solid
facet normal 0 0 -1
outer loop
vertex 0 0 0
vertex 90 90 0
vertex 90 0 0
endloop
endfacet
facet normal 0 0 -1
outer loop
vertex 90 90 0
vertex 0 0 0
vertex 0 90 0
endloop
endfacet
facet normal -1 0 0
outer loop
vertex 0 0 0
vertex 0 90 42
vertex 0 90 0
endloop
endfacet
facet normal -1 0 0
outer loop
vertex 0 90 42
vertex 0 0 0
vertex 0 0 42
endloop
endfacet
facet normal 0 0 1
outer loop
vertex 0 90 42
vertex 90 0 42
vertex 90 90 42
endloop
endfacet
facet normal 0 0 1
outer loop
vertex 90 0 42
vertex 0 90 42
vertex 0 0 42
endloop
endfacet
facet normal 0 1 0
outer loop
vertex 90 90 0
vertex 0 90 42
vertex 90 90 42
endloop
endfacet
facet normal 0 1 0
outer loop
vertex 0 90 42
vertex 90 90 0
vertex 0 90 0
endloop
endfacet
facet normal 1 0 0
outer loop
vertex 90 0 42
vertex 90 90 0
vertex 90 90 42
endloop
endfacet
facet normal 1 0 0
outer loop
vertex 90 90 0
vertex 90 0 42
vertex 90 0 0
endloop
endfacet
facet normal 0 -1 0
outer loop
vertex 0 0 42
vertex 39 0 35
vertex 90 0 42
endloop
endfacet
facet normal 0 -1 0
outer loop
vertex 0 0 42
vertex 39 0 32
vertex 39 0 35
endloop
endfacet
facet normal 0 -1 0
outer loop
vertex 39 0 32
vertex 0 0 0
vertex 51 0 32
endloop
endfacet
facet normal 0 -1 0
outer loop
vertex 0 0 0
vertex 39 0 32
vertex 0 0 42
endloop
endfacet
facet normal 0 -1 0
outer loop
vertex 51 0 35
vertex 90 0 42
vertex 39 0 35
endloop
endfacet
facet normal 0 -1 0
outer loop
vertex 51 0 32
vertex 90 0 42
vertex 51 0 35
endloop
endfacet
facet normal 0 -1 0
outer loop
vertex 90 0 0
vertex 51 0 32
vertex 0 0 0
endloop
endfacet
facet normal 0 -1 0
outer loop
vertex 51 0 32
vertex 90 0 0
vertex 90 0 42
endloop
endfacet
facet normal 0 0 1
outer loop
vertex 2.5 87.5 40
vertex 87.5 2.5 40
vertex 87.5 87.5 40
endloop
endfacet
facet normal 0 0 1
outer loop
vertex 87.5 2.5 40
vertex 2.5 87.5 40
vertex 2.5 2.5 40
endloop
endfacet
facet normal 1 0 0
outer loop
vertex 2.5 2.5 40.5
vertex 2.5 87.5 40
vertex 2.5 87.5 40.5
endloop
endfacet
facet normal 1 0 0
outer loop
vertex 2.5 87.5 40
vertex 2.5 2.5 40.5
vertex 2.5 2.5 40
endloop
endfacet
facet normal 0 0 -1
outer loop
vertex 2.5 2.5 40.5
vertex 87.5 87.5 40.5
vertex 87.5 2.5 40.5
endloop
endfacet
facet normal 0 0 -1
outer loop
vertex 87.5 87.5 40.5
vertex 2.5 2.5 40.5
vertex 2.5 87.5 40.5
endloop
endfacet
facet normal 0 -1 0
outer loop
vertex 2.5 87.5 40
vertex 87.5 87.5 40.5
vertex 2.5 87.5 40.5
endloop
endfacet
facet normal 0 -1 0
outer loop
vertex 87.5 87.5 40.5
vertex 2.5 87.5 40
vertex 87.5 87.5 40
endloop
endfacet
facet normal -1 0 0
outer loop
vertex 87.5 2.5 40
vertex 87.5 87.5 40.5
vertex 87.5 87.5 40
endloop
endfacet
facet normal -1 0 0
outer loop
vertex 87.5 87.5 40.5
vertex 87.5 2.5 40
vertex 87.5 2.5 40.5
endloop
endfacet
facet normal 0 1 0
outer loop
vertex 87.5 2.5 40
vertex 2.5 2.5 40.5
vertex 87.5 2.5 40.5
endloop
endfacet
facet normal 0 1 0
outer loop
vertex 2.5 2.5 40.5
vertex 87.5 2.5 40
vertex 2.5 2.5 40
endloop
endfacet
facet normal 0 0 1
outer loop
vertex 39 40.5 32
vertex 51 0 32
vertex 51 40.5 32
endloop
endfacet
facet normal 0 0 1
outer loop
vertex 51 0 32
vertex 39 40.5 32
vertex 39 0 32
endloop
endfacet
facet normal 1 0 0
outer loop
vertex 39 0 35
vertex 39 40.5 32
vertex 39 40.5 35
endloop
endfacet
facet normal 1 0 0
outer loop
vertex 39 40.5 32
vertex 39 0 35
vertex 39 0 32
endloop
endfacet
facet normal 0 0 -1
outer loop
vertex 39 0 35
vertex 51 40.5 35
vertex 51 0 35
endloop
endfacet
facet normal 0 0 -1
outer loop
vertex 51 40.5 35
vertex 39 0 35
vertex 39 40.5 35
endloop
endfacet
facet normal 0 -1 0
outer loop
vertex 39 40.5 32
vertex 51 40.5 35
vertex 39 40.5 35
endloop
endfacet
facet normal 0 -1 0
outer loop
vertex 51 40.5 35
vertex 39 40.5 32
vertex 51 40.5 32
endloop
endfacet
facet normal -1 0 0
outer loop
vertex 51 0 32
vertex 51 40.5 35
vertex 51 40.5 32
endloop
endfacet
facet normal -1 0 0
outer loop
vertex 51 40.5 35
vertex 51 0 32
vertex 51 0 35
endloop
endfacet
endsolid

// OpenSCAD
// Magnetic stirrer housing for an 80 mm PC case fan
// Print orientation: top plate on bed (z = 0), walls rise to z = 40, open top

// ---------- Parameters ----------
top_thickness      = 2;     // top plate thickness
wall_thickness     = 2.5;   // wall thickness
box_height         = 40;    // total height of walls (open top at z = 40)
outer_size         = 90;    // outer X and Y size of box
hole_count         = 4;     // number of mounting holes in top plate
hole_size          = 4.5;   // mounting hole diameter (M4)
hole_pitch         = 71.5;  // square pattern pitch between hole centres
notch_width        = 12;    // cable notch width, centred along one wall
notch_depth        = 8;     // notch depth from open edge (z = 32 to z = 40)
eps                = 0.5;   // overcut for clean boolean differences

$fn = 96;

// ---------- Derived ----------
inner_size = outer_size - 2 * wall_thickness;   // 85 x 85 mm open area

// ---------- Model ----------
difference() {
    // Solid box: top plate + walls, open at the top
    translate([0, 0, 0])
        linear_extrude(height = box_height + top_thickness)
            square(outer_size);

    // Open the top: cut through the walls above z = box_height
    translate([wall_thickness, wall_thickness, box_height])
        linear_extrude(height = eps)
            square(inner_size);

    // Screw holes through the top plate, centred on the plate
    for (i = [0 : hole_count - 1]) {
        a = i * hole_pitch;
        b = (hole_count - 1 - i) * hole_pitch;
        translate([(a - hole_pitch / 2), (b - hole_pitch / 2), 0])
            cylinder(d = hole_size, h = top_thickness + eps);
    }

    // Cable notch in one wall, centred along the wall
    translate([outer_size / 2 - notch_width / 2, 0, box_height - notch_depth])
        linear_extrude(height = wall_thickness + eps)
            square([notch_width, box_height + eps]);
}
